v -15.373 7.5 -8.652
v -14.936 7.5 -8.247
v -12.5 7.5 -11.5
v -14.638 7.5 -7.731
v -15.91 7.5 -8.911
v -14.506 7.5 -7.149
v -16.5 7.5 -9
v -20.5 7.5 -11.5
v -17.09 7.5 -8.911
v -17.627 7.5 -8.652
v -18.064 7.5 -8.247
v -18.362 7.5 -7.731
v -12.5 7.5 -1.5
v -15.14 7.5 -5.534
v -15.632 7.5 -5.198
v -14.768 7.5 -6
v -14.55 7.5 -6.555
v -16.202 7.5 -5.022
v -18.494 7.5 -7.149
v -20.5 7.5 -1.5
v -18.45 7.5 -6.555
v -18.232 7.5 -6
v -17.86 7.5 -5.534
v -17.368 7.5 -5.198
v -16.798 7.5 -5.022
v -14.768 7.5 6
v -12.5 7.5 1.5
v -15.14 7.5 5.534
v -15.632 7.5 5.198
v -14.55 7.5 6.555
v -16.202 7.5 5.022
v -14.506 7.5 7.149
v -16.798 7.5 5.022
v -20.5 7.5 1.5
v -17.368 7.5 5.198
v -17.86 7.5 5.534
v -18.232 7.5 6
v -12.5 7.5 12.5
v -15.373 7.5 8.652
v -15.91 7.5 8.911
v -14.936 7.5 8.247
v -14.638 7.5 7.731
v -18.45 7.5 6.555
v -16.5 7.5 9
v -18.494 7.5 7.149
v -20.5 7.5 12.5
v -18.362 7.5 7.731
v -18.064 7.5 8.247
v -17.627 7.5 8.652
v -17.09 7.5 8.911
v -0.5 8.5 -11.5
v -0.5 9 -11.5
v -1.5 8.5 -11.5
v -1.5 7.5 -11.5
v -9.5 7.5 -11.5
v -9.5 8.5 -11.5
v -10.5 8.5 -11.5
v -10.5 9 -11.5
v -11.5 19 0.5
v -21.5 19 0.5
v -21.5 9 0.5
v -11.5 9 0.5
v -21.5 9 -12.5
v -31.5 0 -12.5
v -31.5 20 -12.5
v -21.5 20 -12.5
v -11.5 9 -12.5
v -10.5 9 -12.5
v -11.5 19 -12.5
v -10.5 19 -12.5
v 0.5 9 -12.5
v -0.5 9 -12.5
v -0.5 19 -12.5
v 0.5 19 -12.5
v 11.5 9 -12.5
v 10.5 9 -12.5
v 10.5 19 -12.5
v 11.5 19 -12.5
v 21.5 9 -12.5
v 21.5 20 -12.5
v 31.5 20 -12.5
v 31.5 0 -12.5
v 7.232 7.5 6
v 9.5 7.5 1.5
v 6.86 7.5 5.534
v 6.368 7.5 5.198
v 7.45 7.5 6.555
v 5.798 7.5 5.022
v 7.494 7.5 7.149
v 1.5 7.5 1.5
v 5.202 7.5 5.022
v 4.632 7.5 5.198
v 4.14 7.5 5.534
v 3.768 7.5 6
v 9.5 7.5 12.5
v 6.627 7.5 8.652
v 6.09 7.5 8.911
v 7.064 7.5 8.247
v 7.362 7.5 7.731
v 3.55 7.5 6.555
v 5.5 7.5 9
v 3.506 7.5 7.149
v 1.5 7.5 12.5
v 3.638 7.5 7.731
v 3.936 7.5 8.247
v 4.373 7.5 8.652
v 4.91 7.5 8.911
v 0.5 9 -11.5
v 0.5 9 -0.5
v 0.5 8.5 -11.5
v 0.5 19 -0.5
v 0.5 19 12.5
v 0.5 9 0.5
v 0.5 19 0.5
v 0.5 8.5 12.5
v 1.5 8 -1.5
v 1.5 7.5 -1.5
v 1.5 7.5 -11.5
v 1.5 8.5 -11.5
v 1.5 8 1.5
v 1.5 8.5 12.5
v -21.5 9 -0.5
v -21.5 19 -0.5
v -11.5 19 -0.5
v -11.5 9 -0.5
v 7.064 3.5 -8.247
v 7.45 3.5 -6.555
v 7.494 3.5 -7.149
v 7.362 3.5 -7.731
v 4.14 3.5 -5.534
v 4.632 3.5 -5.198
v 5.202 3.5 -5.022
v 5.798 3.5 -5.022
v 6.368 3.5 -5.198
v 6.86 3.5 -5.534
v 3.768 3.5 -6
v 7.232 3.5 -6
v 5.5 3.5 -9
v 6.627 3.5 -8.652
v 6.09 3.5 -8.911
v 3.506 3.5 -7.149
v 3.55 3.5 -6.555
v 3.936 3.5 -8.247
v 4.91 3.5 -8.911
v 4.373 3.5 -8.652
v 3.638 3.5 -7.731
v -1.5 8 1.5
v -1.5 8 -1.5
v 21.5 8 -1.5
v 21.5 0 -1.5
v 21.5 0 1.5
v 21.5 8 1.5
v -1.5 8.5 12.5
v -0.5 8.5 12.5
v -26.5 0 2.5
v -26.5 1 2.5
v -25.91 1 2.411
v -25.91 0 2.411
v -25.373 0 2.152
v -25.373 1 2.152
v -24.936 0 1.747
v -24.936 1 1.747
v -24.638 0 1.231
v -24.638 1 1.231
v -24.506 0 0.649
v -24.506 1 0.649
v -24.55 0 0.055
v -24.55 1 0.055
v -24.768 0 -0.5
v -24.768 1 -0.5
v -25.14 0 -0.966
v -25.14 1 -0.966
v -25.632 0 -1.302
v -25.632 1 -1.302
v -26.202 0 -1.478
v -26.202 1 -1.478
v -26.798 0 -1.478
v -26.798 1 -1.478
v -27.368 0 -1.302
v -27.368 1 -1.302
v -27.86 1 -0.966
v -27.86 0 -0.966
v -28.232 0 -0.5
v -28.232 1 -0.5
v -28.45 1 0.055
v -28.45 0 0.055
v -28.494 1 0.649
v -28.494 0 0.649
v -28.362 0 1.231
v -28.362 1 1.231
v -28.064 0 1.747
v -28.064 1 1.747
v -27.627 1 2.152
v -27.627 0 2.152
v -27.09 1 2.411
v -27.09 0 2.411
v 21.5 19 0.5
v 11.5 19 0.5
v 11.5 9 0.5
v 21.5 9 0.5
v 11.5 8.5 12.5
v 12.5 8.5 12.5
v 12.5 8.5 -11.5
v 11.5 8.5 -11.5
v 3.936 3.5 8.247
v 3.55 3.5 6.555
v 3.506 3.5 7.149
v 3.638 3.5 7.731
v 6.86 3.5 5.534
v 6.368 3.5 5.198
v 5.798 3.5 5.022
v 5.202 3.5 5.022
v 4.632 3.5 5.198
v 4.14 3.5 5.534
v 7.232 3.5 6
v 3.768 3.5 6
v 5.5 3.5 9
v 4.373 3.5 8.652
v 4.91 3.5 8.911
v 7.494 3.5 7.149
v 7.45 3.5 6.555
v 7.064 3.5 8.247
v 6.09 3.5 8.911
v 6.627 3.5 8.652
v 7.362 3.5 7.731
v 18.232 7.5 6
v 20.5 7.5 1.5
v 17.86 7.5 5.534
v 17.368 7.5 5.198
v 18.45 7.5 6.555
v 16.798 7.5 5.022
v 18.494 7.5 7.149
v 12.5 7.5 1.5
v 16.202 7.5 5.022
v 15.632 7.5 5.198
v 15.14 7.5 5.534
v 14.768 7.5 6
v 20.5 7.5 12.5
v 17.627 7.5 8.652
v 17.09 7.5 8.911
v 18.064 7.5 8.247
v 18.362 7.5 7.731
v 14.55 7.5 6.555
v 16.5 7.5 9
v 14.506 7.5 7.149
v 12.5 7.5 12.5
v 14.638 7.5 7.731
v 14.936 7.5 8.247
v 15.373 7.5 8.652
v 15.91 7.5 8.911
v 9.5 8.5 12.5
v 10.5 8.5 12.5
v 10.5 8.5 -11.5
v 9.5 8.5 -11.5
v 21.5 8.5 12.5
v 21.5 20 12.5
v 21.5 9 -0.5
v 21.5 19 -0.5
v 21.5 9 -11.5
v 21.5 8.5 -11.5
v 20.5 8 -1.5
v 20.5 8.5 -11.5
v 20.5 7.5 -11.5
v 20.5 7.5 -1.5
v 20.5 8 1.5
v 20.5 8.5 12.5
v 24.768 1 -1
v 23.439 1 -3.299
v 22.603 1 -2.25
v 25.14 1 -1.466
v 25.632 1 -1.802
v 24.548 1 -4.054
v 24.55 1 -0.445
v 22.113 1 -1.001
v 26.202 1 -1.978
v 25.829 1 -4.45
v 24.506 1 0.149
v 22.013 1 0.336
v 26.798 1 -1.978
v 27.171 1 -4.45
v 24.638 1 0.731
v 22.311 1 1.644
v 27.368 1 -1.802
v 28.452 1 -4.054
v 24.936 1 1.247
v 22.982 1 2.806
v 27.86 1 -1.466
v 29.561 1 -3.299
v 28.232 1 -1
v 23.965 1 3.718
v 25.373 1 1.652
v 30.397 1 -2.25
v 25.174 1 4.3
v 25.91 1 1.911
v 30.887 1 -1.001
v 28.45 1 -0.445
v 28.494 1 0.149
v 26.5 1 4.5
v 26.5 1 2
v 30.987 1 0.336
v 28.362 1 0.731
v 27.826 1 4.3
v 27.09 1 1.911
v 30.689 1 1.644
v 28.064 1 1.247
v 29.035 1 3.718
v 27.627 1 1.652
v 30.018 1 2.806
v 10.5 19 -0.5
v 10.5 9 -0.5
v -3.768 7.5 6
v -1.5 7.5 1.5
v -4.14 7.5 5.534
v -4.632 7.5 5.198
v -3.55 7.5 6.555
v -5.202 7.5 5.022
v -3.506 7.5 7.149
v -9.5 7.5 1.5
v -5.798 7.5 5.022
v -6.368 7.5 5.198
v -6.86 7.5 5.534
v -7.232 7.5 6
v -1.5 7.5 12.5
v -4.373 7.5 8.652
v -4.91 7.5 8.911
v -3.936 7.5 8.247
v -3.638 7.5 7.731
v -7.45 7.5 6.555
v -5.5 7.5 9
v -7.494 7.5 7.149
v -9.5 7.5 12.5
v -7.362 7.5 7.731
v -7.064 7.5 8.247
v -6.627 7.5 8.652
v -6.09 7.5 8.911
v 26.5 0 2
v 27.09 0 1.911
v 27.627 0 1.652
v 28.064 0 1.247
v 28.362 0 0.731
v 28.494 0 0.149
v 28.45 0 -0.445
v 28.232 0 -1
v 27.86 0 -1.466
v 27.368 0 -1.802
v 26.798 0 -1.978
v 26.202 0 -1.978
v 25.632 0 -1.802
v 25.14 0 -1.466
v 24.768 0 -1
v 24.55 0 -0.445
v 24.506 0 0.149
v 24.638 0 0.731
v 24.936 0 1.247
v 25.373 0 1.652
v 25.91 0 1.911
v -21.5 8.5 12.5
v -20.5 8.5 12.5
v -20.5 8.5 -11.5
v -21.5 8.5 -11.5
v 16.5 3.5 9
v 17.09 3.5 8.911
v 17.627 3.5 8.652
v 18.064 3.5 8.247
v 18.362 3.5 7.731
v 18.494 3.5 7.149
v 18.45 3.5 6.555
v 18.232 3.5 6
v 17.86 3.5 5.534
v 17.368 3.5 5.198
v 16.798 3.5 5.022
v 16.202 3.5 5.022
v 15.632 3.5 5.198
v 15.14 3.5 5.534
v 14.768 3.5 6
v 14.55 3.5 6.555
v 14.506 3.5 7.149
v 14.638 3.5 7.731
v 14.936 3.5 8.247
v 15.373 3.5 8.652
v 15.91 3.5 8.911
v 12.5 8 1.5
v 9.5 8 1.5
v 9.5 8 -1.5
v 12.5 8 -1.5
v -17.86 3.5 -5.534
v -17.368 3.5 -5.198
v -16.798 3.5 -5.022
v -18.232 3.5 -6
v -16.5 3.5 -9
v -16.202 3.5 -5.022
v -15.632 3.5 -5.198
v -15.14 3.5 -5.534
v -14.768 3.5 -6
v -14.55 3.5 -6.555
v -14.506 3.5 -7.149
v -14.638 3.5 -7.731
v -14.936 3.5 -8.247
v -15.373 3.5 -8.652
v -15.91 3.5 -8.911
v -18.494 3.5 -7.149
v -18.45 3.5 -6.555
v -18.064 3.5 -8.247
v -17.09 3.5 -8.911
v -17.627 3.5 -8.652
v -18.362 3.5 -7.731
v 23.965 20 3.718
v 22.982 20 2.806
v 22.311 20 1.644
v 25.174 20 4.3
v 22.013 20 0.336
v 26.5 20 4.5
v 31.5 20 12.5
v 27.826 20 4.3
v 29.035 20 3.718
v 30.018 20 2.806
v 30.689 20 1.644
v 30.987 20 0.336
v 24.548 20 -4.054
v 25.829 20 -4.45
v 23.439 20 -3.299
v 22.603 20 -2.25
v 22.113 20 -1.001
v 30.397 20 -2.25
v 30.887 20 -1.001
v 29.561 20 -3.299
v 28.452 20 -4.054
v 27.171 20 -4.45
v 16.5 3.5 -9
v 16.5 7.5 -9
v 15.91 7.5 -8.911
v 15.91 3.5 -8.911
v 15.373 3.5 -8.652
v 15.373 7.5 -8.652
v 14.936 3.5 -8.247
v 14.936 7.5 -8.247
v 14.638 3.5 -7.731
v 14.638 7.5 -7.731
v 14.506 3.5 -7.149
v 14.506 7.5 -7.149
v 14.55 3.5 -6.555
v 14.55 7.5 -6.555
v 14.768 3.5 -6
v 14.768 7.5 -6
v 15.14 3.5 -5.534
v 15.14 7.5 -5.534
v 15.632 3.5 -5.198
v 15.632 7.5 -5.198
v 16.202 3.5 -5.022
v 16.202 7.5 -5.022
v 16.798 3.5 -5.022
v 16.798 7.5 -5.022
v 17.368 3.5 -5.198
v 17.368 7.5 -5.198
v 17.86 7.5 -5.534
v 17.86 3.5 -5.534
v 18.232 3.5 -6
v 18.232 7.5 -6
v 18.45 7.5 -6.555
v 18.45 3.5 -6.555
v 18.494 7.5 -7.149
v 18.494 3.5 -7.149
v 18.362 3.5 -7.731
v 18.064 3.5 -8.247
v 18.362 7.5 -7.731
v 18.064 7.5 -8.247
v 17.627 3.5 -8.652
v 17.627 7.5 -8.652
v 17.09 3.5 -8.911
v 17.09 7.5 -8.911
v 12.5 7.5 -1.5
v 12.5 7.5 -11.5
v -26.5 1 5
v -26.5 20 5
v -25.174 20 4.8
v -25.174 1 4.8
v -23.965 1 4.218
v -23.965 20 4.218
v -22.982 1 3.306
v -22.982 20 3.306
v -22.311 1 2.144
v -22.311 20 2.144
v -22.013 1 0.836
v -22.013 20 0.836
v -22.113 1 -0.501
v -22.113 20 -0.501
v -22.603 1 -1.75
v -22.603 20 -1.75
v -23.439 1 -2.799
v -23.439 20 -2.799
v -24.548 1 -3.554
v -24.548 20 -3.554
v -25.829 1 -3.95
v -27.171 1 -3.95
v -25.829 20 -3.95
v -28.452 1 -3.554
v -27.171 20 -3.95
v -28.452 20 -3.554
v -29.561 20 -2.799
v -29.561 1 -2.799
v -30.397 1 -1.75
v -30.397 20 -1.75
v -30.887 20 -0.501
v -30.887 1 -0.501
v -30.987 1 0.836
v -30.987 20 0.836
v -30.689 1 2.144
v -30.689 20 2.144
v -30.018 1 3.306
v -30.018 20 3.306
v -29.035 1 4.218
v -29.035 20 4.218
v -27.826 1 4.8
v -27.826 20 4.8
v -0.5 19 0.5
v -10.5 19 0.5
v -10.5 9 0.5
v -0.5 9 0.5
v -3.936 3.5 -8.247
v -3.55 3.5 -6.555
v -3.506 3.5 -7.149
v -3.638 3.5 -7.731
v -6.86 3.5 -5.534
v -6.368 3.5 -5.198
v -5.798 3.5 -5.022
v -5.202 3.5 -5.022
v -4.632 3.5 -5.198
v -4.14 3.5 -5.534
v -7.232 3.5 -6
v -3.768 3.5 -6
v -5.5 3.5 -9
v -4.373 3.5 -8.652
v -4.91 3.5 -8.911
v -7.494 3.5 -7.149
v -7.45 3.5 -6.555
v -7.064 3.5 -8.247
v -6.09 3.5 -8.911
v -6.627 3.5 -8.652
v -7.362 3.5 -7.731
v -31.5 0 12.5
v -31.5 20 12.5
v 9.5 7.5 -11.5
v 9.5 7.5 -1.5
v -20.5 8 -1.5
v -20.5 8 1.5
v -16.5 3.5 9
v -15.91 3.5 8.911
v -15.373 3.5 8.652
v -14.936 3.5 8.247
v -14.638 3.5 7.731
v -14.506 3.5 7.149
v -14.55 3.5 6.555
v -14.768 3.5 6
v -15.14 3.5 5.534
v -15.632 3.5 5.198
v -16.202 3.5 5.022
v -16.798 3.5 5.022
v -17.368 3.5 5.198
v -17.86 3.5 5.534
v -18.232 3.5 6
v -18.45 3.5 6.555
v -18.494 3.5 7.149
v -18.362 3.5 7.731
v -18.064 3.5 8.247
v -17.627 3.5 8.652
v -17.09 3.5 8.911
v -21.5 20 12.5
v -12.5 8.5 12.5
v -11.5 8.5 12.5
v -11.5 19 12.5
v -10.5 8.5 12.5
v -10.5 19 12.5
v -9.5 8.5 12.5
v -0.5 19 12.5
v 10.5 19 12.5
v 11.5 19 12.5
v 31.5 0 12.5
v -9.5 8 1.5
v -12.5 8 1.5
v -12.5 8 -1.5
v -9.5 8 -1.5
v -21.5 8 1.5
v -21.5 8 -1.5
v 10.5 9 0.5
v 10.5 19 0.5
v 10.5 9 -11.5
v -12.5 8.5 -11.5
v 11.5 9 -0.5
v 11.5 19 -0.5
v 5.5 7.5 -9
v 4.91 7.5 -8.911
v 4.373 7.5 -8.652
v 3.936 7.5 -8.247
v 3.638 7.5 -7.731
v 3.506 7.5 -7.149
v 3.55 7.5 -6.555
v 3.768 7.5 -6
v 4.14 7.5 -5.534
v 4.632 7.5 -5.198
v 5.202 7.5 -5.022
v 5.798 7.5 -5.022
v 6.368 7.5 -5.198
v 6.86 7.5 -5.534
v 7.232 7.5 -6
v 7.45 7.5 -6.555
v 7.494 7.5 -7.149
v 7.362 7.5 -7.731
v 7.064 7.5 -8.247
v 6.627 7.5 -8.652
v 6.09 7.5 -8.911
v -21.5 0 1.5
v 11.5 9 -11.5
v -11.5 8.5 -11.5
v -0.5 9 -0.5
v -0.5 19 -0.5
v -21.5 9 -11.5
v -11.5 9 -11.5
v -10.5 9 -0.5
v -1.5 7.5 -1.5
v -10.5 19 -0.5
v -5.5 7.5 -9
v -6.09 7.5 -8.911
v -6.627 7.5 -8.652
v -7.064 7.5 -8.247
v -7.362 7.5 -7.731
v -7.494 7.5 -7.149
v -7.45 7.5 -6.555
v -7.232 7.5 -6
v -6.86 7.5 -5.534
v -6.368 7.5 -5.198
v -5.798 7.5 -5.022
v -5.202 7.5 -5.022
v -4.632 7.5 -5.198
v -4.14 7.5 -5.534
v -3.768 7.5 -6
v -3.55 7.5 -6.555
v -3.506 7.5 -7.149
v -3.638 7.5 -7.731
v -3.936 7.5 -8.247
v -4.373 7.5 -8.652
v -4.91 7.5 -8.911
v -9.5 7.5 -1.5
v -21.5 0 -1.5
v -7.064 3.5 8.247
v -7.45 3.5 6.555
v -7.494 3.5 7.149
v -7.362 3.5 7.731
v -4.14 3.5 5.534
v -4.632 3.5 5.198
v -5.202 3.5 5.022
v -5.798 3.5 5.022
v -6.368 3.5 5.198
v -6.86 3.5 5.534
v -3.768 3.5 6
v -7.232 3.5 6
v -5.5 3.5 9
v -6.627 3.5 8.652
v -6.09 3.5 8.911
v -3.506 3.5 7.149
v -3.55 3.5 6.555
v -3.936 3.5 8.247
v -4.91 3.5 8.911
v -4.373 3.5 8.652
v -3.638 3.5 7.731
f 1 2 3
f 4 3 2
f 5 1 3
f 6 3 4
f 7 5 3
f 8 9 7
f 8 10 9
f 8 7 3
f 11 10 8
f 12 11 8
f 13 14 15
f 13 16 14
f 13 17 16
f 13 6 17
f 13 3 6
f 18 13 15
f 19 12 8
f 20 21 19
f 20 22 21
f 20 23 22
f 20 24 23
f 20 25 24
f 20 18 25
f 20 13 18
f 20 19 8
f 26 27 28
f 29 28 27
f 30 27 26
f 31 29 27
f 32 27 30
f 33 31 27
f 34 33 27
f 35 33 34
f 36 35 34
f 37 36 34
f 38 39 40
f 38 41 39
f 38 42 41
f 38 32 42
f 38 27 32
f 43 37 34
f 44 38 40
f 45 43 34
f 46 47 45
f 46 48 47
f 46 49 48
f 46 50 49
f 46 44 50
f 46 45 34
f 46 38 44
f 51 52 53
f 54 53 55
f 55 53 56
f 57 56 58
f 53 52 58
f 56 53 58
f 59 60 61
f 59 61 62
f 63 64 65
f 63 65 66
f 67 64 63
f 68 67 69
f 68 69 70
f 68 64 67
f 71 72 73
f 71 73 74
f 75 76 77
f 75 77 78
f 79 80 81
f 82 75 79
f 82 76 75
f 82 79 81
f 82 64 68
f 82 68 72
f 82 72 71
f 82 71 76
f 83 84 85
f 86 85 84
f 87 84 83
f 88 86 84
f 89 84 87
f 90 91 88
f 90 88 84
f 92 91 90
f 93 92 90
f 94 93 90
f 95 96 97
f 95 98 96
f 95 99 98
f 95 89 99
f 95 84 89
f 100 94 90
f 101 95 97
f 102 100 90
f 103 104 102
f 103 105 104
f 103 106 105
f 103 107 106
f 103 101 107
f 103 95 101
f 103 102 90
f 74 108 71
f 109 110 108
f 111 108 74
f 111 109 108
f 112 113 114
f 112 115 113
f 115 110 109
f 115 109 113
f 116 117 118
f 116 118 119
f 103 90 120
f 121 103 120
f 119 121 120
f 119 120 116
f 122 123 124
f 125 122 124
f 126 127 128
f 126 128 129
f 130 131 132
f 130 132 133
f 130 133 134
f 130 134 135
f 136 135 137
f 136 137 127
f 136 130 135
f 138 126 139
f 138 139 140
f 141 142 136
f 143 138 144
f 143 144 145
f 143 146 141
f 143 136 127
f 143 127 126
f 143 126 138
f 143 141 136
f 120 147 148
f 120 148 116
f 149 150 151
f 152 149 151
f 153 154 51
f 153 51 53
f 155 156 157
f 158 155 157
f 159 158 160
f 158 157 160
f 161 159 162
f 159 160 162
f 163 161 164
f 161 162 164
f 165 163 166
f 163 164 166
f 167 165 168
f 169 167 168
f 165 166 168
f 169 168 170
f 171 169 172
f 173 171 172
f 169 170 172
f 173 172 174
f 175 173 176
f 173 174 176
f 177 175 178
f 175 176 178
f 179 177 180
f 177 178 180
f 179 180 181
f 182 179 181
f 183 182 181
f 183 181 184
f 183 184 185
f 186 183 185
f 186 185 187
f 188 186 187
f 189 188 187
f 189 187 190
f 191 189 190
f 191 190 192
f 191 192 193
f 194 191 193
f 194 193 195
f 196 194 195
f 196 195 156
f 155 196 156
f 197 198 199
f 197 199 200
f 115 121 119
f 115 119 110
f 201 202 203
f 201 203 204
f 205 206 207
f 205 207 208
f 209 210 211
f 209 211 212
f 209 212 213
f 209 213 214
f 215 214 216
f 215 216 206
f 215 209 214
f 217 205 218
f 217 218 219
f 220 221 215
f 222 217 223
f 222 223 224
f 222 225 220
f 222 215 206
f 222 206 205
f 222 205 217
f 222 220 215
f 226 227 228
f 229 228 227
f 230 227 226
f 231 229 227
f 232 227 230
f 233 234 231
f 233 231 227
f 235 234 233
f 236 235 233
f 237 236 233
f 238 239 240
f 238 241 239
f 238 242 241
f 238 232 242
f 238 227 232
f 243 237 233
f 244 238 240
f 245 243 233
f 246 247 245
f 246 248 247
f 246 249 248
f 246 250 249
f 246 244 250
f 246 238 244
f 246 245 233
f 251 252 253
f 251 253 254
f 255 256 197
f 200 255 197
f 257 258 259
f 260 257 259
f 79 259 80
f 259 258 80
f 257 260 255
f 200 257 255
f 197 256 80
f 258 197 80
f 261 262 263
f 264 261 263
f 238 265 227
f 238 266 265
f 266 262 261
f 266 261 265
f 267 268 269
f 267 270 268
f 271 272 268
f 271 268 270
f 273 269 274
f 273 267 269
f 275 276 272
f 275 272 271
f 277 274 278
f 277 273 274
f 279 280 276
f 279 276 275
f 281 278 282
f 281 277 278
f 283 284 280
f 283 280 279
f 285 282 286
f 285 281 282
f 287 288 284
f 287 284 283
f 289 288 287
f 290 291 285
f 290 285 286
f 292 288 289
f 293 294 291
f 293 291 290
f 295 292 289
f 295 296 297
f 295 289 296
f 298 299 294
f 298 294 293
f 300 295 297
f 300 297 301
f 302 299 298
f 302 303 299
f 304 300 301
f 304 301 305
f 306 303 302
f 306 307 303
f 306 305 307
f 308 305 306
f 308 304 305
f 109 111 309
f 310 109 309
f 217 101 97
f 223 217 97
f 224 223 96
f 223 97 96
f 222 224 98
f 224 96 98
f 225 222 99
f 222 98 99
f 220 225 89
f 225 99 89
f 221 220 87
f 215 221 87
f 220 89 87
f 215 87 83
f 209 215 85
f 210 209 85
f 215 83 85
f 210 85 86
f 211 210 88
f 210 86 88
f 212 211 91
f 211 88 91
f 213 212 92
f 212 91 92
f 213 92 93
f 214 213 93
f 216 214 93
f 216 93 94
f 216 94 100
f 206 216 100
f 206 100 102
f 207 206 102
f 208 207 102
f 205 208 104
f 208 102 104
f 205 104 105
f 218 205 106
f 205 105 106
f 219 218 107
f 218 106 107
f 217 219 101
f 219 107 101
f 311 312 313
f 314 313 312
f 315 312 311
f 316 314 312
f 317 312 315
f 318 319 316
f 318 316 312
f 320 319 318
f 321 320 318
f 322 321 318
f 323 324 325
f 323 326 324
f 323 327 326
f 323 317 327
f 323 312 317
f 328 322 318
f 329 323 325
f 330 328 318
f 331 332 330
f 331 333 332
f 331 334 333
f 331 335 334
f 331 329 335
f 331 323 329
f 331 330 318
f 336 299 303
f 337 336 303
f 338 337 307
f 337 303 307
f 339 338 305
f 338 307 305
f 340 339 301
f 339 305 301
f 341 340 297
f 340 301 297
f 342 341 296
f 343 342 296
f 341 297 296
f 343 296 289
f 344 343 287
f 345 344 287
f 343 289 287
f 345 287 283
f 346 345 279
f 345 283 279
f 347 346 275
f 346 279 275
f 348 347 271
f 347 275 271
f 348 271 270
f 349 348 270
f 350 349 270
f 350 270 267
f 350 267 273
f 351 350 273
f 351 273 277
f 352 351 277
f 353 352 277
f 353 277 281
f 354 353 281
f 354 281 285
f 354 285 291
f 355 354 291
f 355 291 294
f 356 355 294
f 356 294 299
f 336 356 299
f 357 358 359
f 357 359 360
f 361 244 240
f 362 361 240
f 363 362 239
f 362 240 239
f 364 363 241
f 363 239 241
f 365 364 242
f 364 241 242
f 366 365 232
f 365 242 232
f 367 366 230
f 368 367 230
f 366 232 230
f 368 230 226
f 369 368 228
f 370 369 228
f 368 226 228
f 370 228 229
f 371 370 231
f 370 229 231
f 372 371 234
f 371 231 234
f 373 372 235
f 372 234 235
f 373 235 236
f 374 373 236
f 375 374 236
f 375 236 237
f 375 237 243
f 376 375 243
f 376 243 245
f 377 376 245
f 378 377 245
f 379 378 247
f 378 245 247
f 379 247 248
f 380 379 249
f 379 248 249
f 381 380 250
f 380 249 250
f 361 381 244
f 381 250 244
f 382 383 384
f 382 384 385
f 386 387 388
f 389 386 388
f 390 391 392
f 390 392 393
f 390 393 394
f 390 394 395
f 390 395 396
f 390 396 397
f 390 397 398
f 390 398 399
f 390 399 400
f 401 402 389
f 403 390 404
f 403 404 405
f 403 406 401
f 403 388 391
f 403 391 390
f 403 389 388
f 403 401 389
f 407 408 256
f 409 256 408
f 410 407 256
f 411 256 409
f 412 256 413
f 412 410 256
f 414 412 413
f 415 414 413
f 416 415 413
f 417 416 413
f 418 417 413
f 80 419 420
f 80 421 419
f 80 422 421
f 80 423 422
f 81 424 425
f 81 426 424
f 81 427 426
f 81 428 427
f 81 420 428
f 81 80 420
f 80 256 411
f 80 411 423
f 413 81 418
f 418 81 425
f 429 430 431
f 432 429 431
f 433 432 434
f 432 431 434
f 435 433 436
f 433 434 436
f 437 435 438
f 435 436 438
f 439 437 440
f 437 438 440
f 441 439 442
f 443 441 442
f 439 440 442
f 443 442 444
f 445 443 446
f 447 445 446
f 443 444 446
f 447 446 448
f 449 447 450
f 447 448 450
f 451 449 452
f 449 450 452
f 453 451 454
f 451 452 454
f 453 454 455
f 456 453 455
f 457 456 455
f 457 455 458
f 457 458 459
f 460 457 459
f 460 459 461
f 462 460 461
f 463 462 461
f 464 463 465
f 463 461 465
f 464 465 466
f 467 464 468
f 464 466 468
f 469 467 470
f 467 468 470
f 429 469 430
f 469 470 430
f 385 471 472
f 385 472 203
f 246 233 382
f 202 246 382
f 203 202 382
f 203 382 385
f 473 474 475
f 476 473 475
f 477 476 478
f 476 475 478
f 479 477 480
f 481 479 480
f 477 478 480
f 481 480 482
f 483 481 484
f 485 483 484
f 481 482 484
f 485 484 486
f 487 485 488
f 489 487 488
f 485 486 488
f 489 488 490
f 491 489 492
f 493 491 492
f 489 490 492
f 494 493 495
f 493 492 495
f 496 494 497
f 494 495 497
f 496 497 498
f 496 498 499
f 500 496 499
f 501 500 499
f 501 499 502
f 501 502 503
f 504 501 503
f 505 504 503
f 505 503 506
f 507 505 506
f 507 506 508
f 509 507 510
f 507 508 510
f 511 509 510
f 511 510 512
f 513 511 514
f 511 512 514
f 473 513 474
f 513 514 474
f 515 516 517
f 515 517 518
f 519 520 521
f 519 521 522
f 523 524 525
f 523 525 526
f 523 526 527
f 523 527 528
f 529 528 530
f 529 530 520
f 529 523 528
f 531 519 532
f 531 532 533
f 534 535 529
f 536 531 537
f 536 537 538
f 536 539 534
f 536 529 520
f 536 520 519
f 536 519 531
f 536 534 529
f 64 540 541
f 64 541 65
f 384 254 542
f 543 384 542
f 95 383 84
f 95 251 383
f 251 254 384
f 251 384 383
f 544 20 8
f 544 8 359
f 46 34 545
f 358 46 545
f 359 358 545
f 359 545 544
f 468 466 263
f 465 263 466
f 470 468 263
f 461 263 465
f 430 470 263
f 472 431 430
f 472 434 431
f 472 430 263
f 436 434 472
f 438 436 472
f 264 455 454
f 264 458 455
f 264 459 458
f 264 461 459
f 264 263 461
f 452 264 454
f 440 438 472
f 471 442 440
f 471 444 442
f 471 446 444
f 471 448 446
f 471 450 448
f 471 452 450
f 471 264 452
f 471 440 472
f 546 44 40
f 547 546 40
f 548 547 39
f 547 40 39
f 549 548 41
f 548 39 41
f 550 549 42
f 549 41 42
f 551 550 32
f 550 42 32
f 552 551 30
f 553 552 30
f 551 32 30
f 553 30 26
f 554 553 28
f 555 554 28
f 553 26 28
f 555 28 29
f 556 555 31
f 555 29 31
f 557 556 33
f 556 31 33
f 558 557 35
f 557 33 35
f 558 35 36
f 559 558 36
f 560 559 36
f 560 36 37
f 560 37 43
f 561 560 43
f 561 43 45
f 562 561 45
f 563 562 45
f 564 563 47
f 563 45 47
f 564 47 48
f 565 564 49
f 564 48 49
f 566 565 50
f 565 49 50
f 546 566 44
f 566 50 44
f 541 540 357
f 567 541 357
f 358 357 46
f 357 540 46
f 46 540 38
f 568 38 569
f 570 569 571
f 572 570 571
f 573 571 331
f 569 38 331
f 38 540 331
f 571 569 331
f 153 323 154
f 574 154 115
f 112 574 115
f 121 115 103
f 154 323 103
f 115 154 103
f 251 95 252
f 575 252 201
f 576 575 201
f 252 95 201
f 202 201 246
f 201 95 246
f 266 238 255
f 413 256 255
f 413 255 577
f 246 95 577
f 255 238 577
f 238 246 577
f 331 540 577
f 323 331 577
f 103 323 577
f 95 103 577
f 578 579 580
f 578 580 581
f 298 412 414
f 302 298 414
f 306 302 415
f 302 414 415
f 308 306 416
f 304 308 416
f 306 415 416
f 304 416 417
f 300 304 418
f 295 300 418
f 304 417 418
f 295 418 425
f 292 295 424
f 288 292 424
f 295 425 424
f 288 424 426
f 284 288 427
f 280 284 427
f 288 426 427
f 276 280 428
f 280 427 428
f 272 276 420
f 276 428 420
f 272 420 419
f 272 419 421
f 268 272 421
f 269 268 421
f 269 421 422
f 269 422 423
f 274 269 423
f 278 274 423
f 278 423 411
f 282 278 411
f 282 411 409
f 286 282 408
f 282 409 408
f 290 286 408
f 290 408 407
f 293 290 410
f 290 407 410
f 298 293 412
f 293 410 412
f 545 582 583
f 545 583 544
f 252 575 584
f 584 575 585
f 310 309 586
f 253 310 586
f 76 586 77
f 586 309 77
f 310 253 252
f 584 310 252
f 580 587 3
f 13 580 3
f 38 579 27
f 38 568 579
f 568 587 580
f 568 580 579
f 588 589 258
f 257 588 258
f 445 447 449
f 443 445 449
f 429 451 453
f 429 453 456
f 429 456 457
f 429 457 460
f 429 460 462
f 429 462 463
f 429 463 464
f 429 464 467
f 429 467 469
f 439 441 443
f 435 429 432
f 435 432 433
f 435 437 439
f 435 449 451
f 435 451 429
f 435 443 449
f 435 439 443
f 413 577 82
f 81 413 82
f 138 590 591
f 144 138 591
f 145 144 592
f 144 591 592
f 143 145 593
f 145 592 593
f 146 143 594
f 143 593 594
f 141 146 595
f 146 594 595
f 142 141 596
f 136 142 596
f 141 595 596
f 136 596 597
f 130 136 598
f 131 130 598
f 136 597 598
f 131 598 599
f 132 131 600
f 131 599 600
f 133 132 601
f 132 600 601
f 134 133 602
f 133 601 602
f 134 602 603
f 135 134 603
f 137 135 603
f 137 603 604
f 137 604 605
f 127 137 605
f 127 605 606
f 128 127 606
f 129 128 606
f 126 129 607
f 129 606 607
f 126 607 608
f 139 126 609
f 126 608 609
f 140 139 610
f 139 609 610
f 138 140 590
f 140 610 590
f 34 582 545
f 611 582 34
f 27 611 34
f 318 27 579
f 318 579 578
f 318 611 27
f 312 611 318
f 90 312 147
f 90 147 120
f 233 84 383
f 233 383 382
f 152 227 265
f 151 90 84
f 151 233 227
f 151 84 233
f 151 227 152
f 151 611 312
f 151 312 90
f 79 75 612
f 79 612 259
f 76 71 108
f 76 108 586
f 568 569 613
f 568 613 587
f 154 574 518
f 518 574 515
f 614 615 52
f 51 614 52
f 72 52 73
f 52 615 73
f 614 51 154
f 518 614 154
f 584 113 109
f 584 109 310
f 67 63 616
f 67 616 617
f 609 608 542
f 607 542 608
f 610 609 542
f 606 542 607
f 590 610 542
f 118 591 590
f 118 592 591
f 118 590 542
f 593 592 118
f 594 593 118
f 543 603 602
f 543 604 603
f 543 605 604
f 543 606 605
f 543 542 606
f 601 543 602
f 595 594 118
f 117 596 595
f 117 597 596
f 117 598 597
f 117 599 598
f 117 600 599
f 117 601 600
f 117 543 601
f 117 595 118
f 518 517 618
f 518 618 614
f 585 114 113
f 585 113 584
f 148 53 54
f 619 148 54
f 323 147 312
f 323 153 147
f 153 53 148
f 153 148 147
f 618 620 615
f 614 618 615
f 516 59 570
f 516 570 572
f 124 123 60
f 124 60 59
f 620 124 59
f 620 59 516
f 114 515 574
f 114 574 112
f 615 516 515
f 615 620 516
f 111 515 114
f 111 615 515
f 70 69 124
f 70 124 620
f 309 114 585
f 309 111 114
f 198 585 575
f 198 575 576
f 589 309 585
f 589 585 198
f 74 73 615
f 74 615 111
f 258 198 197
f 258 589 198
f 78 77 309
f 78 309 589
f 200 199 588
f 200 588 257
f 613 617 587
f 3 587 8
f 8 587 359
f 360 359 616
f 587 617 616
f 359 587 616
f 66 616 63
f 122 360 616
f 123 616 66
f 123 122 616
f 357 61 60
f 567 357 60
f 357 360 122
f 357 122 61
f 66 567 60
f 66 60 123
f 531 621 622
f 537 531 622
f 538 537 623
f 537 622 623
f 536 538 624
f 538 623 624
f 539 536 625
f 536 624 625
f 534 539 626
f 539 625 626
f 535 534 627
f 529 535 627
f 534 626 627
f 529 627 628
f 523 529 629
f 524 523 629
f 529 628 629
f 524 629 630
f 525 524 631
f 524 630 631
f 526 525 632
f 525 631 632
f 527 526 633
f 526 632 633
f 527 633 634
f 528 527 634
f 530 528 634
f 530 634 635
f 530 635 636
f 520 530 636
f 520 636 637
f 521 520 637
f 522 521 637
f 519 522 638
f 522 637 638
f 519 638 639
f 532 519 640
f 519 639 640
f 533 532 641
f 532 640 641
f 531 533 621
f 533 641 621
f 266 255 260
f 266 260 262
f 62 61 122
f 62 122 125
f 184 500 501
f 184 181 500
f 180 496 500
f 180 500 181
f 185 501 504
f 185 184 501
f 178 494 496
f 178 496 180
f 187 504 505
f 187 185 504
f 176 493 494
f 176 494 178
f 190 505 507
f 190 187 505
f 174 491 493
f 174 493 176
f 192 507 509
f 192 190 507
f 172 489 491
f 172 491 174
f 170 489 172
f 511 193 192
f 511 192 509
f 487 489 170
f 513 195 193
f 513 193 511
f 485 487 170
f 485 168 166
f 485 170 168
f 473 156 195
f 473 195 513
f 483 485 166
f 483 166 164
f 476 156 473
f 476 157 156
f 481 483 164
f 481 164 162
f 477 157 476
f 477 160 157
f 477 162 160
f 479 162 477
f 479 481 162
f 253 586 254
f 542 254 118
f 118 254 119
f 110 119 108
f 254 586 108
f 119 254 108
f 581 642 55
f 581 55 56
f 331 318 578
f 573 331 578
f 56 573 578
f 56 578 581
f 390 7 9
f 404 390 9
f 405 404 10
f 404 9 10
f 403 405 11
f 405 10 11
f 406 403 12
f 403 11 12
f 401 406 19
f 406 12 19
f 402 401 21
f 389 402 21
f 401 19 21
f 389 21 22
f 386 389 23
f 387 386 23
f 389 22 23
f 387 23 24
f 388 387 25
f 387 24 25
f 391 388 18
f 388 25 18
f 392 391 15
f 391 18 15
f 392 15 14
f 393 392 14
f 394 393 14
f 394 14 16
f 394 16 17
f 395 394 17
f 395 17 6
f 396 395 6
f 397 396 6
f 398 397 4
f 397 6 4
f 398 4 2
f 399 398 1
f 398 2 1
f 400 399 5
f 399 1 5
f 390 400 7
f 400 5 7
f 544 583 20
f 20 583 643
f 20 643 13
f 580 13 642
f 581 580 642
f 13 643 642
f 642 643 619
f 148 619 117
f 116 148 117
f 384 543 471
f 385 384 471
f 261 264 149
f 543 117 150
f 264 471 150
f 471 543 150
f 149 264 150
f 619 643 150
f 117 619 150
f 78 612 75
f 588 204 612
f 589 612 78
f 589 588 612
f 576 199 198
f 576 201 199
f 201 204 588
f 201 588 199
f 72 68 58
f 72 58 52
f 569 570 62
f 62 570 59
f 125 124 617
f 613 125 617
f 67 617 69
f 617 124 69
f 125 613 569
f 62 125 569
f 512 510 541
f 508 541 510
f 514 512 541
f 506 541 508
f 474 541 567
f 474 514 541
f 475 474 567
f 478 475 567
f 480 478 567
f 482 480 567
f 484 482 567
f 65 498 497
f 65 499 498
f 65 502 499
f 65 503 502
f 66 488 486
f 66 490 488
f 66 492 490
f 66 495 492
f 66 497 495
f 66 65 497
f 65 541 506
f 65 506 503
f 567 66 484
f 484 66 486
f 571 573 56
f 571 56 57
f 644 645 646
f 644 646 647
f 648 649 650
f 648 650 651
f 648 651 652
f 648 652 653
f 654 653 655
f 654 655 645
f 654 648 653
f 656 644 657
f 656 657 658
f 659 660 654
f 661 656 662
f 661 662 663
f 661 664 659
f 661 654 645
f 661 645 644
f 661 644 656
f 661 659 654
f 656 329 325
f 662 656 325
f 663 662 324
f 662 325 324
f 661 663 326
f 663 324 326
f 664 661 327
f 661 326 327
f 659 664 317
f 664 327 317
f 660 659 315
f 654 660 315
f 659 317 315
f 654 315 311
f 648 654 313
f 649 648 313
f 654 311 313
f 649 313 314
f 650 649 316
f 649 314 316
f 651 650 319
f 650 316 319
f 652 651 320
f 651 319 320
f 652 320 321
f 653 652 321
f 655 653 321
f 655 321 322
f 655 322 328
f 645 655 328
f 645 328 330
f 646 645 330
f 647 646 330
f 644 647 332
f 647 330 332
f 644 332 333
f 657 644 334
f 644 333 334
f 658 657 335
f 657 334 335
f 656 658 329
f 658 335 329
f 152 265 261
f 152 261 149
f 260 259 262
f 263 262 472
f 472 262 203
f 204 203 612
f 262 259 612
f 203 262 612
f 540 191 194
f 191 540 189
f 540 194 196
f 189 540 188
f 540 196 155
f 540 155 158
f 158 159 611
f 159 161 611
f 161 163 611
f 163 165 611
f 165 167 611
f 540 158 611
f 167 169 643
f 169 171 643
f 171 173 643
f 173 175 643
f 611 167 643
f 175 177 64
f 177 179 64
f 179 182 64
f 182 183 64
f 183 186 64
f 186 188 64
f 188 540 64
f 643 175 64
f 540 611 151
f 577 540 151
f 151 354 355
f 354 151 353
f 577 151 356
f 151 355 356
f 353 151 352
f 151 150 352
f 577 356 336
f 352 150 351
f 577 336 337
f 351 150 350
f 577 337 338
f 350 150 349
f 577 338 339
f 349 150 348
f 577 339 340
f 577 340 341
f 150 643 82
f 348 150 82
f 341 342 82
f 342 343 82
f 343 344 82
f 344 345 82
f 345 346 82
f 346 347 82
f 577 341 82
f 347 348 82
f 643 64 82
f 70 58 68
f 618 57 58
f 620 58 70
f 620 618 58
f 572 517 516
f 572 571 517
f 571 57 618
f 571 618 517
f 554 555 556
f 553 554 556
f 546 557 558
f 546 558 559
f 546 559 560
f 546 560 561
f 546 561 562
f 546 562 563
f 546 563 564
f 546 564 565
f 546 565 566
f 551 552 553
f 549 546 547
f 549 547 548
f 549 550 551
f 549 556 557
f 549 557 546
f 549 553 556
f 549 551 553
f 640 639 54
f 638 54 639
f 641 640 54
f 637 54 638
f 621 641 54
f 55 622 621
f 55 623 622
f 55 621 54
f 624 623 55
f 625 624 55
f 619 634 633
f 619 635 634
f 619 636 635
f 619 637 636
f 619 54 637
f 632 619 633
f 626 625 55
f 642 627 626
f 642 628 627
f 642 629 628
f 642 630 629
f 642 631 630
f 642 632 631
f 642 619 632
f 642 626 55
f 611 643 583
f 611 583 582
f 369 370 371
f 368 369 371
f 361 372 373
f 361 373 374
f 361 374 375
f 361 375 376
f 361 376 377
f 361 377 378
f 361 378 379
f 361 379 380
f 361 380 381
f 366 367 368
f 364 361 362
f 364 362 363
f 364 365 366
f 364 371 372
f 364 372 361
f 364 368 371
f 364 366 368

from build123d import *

# Parameters (mm, degrees)
SKETCH2_W           = 63
SKETCH2_H           = 25
BOSS_EXTRUDE2_DEPTH = 20
SKETCH5_W           = 43
SKETCH5_H           = 25
CUT_EXTRUDE2_DEPTH  = 1
SKETCH6_W           = 10
SKETCH6_H           = 12
CUT_EXTRUDE3_DEPTH  = 10
CUT_EXTRUDE4_DEPTH  = 24
SKETCH8_W           = 43
SKETCH8_H           = 3
CUT_EXTRUDE5_DEPTH  = 8
SKETCH9_R           = 2
CUT_EXTRUDE6_DEPTH  = 4
SKETCH10_R          = 4.5
CUT_EXTRUDE7_DEPTH  = 19
SKETCH11_R          = 2
CUT_EXTRUDE8_DEPTH  = 19


with BuildPart() as part:
    # Sketch2 → Boss-Extrude2 (new body)
    with BuildSketch(Plane(origin=(0, 0, 0), x_dir=(1, 0, 0), z_dir=(0, 1, 0))):
        Rectangle(SKETCH2_W, SKETCH2_H)
    extrude(amount=BOSS_EXTRUDE2_DEPTH)

    # Sketch5 → Cut-Extrude2 (cut)
    with BuildSketch(Plane(origin=(0, 20, 0), x_dir=(1, 0, 0), z_dir=(0, 1, 0))):
        Rectangle(SKETCH5_W, SKETCH5_H)
    extrude(amount=-CUT_EXTRUDE2_DEPTH, mode=Mode.SUBTRACT)

    # Sketch6 → Cut-Extrude3 (cut)
    with BuildSketch(Plane(origin=(0, 19, 0), x_dir=(1, 0, 0), z_dir=(0, 1, 0))):
        with Locations((-16.5, 6.5)):
            Rectangle(SKETCH6_W, SKETCH6_H)
        with Locations((-16.5, -6.5)):
            Rectangle(SKETCH6_W, SKETCH6_H)
        with Locations((-5.5, -6.5)):
            Rectangle(SKETCH6_W, SKETCH6_H)
        with Locations((-5.5, 6.5)):
            Rectangle(SKETCH6_W, SKETCH6_H)
        with Locations((5.5, 6.5)):
            Rectangle(SKETCH6_W, SKETCH6_H)
        with Locations((5.5, -6.5)):
            Rectangle(SKETCH6_W, SKETCH6_H)
        with Locations((16.5, -6.5)):
            Rectangle(SKETCH6_W, SKETCH6_H)
        with Locations((16.5, 6.5)):
            Rectangle(SKETCH6_W, SKETCH6_H)
    extrude(amount=-CUT_EXTRUDE3_DEPTH, mode=Mode.SUBTRACT)

    # Sketch7 → Cut-Extrude4 (cut)
    with BuildSketch(Plane.XY.offset(12.5)):
        Polygon((-21.5, 9), (-11.5, 9), (-11.5, 8.5), (-12.5, 8.5), (-12.5, 7.5), (-20.5, 7.5), (-20.5, 8.5), (-21.5, 8.5), align=None)
        Polygon((-10.5, 9), (-0.5, 9), (-0.5, 8.5), (-1.5, 8.5), (-1.5, 7.5), (-9.5, 7.5), (-9.5, 8.5), (-10.5, 8.5), align=None)
        Polygon((0.5, 9), (10.5, 9), (10.5, 8.5), (9.5, 8.5), (9.5, 7.5), (1.5, 7.5), (1.5, 8.5), (0.5, 8.5), align=None)
        Polygon((11.5, 9), (21.5, 9), (21.5, 8.5), (20.5, 8.5), (20.5, 7.5), (12.5, 7.5), (12.5, 8.5), (11.5, 8.5), align=None)
    extrude(amount=-CUT_EXTRUDE4_DEPTH, mode=Mode.SUBTRACT)

    # Sketch8 → Cut-Extrude5 (cut)
    with BuildSketch(Plane.XZ):
        Rectangle(SKETCH8_W, SKETCH8_H)
    extrude(amount=-CUT_EXTRUDE5_DEPTH, mode=Mode.SUBTRACT)

    # Sketch9 → Cut-Extrude6 (cut)
    with BuildSketch(Plane(origin=(0, 7.5, 0), x_dir=(1, 0, 0), z_dir=(0, 1, 0))):
        with Locations(Location((-16.5, -7, 0), (0, 0, 270))):
            Circle(SKETCH9_R)
        with Locations(Location((-5.5, -7, 0), (0, 0, 270))):
            Circle(SKETCH9_R)
        with Locations(Location((5.5, -7, 0), (0, 0, 270))):
            Circle(SKETCH9_R)
        with Locations(Location((16.5, -7, 0), (0, 0, 270))):
            Circle(SKETCH9_R)
        with Locations(Location((16.5, 7, 0), (0, 0, 90))):
            Circle(SKETCH9_R)
        with Locations(Location((5.5, 7, 0), (0, 0, 90))):
            Circle(SKETCH9_R)
        with Locations(Location((-5.5, 7, 0), (0, 0, 90))):
            Circle(SKETCH9_R)
        with Locations(Location((-16.5, 7, 0), (0, 0, 90))):
            Circle(SKETCH9_R)
    extrude(amount=-CUT_EXTRUDE6_DEPTH, mode=Mode.SUBTRACT)

    # Sketch10 → Cut-Extrude7 (cut)
    with BuildSketch(Plane(origin=(0, 20, 0), x_dir=(1, 0, 0), z_dir=(0, 1, 0))):
        with Locations(Location((26.5, 0, 0), (0, 0, 270))):
            Circle(SKETCH10_R)
        with Locations(Location((-26.5, -0.5, 0), (0, 0, 270))):
            Circle(SKETCH10_R)
    extrude(amount=-CUT_EXTRUDE7_DEPTH, mode=Mode.SUBTRACT)

    # Sketch11 → Cut-Extrude8 (cut)
    with BuildSketch(Plane(origin=(0, 1, 0), x_dir=(1, 0, 0), z_dir=(0, 1, 0))):
        with Locations(Location((-26.5, -0.5, 0), (0, 0, 270))):
            Circle(SKETCH11_R)
        with Locations(Location((26.5, 0, 0), (0, 0, 270))):
            Circle(SKETCH11_R)
    extrude(amount=-CUT_EXTRUDE8_DEPTH, mode=Mode.SUBTRACT)


solid = part.part
